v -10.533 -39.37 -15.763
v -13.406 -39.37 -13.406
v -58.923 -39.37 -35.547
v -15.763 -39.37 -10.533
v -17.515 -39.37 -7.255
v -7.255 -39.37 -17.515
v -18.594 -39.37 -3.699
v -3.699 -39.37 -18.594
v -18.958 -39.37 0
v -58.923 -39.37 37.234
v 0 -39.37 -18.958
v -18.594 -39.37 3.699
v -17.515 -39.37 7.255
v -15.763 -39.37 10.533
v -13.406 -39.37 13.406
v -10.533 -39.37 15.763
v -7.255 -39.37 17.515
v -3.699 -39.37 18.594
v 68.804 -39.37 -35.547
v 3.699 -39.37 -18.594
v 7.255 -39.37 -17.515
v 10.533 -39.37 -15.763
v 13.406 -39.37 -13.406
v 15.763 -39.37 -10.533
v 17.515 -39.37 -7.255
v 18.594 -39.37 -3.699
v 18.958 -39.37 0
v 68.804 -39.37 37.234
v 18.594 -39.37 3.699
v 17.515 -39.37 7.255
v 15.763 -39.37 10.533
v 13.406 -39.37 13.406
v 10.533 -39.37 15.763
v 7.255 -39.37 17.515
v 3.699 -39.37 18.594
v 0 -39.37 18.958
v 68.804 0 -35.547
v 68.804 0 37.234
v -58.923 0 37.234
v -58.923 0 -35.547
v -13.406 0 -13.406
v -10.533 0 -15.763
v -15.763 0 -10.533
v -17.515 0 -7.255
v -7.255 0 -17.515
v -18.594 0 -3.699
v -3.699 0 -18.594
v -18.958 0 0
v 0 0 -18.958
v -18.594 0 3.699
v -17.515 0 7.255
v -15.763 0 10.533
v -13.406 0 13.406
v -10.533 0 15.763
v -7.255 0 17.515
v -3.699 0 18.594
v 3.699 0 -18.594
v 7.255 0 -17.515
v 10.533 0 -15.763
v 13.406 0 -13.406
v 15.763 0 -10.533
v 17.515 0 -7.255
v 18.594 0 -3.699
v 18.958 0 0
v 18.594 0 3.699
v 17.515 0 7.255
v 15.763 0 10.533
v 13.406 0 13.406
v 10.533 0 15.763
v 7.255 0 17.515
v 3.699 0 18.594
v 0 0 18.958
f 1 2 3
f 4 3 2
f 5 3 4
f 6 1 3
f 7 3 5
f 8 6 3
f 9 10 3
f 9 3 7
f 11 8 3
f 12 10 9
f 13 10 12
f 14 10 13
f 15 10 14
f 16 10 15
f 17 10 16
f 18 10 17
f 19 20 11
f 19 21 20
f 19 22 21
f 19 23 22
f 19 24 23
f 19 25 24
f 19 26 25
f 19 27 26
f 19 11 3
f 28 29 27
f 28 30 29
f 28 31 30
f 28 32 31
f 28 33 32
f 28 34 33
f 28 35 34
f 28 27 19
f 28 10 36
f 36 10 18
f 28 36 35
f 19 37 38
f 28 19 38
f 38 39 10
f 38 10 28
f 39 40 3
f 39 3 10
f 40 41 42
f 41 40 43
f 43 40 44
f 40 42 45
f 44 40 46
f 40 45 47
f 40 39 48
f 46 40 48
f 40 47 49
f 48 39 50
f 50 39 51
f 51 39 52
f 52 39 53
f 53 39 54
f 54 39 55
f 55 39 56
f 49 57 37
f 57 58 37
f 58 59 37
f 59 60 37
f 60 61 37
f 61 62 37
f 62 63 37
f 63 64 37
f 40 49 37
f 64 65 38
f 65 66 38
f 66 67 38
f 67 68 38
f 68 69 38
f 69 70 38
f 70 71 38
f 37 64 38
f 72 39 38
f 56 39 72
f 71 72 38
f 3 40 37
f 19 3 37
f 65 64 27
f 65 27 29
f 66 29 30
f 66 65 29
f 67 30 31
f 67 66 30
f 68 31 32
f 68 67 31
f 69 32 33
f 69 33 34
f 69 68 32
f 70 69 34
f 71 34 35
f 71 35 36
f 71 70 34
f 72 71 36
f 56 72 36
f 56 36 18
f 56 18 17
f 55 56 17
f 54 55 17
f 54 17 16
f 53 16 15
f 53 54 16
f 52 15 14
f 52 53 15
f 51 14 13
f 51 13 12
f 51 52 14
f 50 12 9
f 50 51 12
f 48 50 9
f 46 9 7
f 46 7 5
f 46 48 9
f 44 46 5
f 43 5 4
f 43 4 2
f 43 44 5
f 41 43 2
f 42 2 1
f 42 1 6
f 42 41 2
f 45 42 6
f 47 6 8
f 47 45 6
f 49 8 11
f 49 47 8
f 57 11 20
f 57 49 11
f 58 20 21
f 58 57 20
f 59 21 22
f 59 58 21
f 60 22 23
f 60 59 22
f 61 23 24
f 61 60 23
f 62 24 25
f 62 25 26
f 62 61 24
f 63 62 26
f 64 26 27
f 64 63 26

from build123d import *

# Parameters (mm, degrees)
F0_W     = 127.7268081903
F0_H     = 72.7801807225
F0_R     = 18.9582782215
F2_DEPTH = 39.37


# Not quite as in the source:
# - the program builds the solid bodies; features that only make, move or delete a surface that nothing else refers to are left out


with BuildPart() as f2:
    # F0 (on Front) → F2 (new body)
    with BuildSketch(Plane.XZ):
        with Locations((4.9403756857, 0.8434783667)):
            Rectangle(F0_W, F0_H)
        Circle(F0_R, mode=Mode.SUBTRACT)
    extrude(amount=F2_DEPTH)


solid = f2.part
